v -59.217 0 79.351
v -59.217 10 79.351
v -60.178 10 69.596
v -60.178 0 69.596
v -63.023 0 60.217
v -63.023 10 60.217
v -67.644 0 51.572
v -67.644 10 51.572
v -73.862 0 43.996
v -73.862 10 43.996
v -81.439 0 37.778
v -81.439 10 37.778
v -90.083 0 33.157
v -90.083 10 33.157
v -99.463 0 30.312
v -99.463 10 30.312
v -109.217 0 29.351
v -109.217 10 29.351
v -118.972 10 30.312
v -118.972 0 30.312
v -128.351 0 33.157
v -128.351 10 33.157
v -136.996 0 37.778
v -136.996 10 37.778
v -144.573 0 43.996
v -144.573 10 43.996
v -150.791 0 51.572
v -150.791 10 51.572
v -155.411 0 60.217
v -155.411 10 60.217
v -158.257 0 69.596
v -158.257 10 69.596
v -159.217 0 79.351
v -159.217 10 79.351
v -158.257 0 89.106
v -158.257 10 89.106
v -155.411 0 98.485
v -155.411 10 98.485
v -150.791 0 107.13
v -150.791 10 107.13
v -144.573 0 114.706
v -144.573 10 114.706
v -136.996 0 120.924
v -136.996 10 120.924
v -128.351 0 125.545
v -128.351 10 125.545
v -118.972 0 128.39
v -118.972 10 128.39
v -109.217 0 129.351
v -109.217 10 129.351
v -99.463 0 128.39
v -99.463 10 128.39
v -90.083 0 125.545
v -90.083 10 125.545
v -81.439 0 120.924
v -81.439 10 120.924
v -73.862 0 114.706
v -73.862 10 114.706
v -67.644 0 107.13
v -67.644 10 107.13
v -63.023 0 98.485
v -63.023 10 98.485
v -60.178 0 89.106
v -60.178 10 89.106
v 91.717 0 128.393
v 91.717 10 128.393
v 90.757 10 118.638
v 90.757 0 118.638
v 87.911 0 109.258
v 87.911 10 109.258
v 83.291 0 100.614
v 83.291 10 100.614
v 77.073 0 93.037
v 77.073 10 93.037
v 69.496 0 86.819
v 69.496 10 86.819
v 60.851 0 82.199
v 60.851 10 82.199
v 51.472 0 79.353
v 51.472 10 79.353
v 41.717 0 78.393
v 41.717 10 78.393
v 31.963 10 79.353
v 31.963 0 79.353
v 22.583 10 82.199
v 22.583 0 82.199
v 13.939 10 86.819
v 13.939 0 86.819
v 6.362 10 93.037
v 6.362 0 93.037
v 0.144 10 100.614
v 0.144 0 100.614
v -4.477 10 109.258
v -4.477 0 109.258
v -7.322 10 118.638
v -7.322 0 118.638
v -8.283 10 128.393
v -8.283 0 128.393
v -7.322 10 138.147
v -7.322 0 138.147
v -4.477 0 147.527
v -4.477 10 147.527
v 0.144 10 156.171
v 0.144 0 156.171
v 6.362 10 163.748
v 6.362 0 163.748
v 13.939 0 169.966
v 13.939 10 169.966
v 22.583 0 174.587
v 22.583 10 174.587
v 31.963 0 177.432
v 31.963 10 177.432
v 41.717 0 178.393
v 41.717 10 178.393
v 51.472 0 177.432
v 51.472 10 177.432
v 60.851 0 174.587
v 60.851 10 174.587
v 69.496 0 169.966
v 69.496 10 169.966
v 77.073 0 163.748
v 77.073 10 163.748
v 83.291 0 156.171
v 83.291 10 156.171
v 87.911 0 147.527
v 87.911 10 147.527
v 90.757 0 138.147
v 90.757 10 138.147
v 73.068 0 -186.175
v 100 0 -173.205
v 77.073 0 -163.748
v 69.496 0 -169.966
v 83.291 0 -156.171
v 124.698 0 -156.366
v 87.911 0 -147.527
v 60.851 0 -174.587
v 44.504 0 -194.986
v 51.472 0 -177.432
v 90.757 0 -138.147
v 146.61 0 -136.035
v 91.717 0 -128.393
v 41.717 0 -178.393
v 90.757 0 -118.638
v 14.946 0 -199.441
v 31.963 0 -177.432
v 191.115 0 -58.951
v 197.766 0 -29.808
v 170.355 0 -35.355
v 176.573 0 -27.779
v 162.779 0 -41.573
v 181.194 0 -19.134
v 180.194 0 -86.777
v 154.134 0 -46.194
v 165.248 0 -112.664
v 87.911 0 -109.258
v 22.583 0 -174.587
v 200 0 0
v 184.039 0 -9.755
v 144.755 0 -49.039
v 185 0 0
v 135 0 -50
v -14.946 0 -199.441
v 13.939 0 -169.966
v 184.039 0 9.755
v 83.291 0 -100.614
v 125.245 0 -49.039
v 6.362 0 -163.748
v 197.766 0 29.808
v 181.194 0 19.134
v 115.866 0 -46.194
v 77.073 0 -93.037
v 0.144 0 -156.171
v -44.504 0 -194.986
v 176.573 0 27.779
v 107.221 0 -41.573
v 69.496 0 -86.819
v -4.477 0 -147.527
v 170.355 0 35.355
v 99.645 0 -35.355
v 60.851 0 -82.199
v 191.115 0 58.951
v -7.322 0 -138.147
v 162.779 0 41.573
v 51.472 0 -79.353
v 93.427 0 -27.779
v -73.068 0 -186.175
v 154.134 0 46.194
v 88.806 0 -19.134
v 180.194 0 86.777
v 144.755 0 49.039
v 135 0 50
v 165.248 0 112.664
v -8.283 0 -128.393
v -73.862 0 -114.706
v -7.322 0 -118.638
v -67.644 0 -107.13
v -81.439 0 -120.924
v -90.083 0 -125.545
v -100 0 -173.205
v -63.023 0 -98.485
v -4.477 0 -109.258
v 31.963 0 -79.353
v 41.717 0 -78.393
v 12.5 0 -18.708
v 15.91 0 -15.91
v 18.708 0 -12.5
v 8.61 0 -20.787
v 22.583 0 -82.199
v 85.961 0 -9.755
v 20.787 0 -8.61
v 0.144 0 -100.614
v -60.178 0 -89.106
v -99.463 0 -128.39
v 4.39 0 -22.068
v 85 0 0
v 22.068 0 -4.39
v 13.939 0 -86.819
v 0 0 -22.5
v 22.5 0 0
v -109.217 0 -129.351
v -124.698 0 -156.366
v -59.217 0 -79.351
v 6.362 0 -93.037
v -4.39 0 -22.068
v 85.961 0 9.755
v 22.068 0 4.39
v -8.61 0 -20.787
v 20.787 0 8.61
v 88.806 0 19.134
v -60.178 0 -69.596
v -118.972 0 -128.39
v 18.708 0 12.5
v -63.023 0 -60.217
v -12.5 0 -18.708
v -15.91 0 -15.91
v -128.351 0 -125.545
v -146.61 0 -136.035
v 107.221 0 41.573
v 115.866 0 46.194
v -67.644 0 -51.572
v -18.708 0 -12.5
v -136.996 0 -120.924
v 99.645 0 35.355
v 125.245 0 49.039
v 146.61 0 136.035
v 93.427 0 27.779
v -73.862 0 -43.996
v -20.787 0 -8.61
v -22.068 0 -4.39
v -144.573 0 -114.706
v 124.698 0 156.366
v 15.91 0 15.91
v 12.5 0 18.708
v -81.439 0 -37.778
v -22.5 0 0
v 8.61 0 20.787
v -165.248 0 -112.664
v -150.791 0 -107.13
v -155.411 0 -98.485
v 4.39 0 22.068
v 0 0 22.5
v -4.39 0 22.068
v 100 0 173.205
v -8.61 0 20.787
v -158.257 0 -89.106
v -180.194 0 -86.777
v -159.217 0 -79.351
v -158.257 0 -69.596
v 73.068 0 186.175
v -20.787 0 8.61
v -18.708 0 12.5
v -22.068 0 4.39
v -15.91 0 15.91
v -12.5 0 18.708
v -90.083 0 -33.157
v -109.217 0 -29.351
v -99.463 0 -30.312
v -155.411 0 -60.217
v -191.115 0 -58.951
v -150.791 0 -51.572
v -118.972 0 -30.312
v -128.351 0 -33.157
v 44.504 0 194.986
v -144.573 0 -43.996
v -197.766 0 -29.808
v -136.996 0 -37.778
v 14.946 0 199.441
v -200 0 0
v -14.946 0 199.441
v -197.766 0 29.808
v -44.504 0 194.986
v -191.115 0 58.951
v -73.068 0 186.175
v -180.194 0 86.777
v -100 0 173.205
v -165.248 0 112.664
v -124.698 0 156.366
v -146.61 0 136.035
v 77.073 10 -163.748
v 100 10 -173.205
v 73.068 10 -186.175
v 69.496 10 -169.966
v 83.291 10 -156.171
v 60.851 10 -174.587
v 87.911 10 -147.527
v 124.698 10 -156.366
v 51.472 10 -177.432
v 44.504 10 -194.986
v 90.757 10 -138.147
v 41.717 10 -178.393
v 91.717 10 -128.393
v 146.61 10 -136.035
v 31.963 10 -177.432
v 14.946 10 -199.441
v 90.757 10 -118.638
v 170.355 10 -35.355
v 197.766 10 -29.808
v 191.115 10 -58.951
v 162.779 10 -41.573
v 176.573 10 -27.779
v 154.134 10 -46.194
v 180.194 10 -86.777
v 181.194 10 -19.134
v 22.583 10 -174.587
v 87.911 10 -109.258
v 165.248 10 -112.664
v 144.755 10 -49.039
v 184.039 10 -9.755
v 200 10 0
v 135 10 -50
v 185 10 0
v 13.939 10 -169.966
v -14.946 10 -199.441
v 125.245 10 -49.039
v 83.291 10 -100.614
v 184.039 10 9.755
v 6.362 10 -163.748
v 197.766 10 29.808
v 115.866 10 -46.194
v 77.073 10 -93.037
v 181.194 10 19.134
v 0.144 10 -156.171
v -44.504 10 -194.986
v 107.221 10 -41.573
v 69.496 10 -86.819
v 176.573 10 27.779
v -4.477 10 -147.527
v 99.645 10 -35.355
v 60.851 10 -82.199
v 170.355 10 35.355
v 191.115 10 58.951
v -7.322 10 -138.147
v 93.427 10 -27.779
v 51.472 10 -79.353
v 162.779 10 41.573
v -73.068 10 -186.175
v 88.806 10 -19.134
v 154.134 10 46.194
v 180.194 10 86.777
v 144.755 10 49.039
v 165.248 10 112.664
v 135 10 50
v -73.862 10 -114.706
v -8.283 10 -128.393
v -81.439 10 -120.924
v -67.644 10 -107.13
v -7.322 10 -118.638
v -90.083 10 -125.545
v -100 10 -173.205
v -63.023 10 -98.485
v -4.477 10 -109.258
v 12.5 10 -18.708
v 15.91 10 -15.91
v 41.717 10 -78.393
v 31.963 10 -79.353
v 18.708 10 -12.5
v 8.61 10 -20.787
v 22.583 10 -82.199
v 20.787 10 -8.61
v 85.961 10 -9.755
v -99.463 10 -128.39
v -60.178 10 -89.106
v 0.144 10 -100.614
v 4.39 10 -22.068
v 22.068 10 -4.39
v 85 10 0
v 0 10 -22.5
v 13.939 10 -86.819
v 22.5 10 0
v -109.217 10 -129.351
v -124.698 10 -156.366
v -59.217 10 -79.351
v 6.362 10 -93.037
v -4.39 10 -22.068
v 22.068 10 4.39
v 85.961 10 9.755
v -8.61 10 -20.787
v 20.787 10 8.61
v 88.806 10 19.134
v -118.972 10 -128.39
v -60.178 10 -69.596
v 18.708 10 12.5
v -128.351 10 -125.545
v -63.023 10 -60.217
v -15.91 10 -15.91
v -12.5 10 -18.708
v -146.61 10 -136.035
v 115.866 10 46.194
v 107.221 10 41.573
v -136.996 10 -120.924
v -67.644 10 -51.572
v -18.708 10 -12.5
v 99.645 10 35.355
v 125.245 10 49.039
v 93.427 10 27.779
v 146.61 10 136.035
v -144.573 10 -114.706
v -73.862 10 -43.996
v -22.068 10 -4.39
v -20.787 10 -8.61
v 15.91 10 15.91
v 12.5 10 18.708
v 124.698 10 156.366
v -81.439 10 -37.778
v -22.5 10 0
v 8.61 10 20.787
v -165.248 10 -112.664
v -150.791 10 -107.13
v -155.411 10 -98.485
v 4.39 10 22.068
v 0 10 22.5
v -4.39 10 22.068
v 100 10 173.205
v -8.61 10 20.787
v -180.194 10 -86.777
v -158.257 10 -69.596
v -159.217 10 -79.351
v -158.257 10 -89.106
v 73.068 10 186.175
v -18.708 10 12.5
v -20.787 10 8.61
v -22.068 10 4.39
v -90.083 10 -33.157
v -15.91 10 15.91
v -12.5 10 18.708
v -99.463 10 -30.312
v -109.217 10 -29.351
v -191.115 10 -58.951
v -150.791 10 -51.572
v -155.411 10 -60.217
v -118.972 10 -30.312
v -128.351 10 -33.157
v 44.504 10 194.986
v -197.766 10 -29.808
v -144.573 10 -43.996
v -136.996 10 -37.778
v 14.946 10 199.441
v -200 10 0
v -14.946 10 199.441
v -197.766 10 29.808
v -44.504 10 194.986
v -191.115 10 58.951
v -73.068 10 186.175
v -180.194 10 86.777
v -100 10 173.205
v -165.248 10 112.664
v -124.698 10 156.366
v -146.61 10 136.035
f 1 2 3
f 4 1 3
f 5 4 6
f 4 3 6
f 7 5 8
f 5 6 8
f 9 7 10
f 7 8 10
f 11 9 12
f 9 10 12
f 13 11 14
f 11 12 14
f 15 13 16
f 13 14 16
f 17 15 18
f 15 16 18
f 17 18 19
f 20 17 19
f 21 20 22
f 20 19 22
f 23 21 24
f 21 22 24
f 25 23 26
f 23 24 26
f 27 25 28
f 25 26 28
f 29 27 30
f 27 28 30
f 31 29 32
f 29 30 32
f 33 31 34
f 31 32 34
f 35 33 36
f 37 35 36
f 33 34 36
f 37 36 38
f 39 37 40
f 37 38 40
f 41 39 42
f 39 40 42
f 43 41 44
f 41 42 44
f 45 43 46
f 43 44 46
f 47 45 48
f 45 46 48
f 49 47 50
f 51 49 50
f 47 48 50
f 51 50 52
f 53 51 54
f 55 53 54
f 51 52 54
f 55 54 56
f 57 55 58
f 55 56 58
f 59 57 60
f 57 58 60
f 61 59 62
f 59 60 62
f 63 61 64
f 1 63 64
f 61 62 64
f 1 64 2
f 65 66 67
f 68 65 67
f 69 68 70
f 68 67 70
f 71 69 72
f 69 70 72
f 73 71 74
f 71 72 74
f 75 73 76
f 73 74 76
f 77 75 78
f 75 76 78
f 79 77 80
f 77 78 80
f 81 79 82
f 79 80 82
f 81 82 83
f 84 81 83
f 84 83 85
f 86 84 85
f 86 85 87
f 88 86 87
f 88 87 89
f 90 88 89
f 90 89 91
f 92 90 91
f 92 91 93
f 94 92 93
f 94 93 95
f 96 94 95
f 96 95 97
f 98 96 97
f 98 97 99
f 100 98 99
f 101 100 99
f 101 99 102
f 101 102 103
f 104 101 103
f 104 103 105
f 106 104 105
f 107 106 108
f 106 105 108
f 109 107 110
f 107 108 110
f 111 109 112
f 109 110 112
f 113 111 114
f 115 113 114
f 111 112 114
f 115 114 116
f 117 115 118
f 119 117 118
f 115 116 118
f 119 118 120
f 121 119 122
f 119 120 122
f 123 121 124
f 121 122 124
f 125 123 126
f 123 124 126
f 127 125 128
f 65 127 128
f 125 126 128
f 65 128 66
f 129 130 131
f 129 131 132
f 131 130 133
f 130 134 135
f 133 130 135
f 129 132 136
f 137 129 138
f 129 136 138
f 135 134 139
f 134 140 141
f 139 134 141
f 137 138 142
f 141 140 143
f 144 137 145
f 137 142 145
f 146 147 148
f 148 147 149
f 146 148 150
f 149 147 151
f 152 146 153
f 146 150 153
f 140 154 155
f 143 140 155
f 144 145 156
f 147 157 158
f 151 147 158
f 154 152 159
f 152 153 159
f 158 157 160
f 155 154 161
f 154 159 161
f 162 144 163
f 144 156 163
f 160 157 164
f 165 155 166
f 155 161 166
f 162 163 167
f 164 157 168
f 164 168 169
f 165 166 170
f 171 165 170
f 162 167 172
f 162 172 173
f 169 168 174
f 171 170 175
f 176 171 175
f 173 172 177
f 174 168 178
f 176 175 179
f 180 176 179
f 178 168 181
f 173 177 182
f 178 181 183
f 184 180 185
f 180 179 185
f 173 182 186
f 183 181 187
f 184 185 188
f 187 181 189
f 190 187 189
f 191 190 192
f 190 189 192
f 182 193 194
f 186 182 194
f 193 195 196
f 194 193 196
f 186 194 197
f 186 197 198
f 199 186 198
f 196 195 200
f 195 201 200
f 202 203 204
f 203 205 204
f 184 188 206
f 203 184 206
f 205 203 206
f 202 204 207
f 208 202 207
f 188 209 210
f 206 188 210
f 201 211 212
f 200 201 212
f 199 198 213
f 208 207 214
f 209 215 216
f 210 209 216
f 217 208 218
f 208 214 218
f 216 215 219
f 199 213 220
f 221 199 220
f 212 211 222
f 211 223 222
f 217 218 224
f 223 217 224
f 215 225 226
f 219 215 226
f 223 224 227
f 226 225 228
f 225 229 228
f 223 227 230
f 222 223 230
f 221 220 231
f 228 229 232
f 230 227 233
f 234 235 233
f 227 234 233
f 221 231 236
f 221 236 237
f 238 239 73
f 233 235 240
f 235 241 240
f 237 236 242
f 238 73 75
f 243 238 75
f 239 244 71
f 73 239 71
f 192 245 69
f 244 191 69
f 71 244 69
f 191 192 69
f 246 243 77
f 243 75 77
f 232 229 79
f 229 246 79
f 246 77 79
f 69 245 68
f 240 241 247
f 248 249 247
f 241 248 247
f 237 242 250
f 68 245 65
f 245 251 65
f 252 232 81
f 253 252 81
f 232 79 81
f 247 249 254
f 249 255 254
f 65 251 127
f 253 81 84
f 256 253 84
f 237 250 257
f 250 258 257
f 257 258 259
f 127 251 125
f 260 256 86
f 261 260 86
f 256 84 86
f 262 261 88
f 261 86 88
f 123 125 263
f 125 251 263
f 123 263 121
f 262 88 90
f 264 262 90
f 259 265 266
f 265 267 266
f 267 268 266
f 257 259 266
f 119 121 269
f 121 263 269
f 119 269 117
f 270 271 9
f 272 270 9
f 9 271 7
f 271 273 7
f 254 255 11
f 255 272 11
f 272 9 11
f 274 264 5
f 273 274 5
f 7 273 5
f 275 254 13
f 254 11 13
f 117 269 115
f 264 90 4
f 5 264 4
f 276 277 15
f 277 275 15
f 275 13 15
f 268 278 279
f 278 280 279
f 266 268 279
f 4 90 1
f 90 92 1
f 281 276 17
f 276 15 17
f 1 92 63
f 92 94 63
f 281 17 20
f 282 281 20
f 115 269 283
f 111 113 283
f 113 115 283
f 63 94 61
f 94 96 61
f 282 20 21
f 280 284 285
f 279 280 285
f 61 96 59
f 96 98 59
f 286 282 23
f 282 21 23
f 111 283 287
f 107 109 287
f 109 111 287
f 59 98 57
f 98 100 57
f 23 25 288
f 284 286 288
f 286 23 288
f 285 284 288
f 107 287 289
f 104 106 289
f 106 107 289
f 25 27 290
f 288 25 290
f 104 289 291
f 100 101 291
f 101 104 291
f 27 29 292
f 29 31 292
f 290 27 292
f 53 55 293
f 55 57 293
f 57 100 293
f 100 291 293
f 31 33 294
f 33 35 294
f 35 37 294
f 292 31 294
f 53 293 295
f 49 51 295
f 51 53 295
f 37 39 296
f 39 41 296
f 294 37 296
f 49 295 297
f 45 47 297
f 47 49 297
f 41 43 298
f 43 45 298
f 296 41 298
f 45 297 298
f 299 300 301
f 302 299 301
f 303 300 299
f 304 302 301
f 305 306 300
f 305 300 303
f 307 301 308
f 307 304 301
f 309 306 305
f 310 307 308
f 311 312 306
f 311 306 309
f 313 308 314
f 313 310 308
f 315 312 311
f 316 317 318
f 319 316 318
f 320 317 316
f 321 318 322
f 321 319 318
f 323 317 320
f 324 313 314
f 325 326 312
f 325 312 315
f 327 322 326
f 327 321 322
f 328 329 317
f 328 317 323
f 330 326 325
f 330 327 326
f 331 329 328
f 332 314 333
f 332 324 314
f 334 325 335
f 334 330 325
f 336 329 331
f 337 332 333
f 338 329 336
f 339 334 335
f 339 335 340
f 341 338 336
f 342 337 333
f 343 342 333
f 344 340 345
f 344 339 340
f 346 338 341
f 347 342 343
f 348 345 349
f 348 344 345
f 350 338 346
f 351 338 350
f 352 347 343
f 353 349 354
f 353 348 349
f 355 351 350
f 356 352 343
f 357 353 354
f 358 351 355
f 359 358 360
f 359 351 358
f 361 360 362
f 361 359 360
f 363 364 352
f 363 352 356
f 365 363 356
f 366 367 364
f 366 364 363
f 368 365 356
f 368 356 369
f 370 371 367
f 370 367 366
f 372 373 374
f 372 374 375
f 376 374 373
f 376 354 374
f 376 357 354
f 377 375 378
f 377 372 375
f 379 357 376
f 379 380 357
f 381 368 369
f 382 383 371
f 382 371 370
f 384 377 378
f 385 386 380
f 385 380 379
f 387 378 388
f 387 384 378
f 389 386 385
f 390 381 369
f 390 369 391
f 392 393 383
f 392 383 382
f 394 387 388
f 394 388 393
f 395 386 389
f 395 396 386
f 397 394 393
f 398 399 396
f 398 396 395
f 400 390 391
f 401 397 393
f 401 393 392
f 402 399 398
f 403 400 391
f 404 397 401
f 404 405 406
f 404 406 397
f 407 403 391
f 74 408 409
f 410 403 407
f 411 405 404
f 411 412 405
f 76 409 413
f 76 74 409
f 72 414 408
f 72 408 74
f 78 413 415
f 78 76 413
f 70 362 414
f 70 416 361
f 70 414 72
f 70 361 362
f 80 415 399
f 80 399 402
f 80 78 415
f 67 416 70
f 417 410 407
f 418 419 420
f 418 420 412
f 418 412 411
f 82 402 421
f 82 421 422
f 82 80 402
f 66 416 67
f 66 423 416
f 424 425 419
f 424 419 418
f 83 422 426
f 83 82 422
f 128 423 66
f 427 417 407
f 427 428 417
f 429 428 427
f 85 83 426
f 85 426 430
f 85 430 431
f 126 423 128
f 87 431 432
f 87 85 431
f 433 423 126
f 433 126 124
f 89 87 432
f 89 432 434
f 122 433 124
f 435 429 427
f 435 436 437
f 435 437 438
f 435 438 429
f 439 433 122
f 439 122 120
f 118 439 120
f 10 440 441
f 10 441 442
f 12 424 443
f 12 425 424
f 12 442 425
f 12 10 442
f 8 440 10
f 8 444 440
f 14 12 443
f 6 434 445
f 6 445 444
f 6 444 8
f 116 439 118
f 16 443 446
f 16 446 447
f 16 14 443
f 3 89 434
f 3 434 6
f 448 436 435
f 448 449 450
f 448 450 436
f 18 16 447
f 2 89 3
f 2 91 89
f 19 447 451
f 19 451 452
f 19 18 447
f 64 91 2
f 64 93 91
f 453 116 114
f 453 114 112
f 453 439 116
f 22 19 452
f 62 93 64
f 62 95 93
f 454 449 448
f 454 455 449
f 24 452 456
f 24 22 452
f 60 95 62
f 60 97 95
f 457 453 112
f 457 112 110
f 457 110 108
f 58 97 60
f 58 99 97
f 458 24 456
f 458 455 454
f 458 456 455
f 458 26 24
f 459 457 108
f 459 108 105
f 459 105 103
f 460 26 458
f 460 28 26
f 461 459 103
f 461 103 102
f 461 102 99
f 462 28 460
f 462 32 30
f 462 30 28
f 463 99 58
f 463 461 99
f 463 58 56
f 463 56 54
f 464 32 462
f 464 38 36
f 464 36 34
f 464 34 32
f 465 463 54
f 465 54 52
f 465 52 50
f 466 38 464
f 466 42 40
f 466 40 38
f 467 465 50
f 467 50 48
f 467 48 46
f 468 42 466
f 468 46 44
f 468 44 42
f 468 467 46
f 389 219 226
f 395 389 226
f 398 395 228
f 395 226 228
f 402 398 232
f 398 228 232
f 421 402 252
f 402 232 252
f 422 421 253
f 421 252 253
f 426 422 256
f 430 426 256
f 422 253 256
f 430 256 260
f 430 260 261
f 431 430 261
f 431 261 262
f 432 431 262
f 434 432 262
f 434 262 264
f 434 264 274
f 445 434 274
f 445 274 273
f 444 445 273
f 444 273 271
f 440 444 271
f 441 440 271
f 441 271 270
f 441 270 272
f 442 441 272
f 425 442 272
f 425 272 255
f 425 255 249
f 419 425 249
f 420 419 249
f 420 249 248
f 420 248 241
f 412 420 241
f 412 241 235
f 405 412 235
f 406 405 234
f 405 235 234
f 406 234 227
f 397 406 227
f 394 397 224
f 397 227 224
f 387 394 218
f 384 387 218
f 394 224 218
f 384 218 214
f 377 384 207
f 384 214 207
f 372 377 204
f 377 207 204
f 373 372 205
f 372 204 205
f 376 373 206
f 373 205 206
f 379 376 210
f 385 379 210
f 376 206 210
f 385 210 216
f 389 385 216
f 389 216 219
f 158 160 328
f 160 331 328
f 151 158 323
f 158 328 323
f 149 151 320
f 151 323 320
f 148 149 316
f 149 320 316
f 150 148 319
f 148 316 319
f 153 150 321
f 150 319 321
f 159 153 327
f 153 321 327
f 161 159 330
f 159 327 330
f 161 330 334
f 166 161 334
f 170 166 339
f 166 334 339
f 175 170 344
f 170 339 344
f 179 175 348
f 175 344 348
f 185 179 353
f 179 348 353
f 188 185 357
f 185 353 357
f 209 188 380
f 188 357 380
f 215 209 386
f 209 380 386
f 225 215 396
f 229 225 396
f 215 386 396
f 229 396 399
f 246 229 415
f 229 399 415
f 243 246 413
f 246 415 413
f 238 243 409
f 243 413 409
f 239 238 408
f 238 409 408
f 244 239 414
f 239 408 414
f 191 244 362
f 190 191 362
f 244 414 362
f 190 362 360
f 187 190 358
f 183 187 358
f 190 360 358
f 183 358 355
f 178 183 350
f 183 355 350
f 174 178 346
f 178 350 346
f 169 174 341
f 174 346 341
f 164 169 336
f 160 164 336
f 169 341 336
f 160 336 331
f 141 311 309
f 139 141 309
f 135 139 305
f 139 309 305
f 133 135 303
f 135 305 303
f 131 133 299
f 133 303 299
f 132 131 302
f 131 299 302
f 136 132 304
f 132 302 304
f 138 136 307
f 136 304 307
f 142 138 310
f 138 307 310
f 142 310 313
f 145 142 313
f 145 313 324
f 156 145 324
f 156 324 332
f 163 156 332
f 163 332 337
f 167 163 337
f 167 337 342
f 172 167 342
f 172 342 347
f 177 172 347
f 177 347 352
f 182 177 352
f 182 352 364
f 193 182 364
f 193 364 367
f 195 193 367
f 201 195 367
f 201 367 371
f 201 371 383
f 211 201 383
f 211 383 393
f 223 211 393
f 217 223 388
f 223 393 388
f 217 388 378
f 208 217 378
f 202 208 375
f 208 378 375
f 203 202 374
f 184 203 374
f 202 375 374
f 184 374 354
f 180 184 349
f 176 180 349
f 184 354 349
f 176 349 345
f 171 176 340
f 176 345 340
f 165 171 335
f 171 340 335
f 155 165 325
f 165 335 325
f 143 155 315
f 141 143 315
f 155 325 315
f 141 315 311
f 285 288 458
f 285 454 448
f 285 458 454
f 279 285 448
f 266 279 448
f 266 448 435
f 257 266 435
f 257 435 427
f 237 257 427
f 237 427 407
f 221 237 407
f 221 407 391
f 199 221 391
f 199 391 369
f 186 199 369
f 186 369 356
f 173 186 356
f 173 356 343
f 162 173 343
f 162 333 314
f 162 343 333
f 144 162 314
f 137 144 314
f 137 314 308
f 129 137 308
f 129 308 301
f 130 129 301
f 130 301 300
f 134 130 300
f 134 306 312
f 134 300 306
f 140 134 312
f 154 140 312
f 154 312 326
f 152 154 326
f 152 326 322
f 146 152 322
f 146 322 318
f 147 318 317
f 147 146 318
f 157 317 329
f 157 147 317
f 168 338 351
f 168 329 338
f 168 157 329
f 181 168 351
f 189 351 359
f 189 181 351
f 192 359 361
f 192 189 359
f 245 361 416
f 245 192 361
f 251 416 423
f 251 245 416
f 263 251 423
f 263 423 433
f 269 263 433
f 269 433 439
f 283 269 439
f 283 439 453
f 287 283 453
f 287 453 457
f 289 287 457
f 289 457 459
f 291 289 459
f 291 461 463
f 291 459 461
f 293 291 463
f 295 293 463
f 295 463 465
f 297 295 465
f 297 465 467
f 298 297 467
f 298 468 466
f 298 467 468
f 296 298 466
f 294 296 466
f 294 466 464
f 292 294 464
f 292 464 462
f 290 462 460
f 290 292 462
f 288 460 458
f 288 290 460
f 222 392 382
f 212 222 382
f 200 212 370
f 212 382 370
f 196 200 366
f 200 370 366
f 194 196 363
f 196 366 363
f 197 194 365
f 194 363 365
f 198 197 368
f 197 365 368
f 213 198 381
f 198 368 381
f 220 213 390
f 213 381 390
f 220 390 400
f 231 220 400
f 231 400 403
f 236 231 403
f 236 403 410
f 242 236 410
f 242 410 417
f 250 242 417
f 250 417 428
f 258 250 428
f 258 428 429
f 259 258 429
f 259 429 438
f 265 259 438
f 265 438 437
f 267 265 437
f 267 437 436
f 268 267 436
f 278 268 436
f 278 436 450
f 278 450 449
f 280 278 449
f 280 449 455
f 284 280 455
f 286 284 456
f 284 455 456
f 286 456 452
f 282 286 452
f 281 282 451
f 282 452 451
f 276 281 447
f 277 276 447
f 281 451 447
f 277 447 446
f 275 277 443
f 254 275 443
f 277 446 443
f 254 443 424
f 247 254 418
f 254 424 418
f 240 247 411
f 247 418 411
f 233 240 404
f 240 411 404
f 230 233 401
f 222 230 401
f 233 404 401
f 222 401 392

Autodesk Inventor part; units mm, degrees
ref_plane "YZ Plane" through (0, 0, 0) normal (1, 0, 0) x (0, 1, 0)
ref_plane "XZ Plane" through (0, 0, 0) normal (0, 1, 0) x (-1, 0, 0)
ref_plane "XY Plane" through (0, 0, 0) normal (0, 0, 1) x (1, 0, 0)
sketch "Skizze1" plane through (0, 0, 0) normal (0, 1, 0) x (-1, 0, 0)
  circle A0 centre (0, 0) radius 200
  dimension "d0" = 400
extrude "Extrusion1" add sketch "Skizze1" along normal blind 10
sketch "Skizze2" plane through (0, 10, 0) normal (0, 1, 0) x (1, 0, 0)
  circle A0 centre (0, 0) radius 200 projected
  line L0 (0, 0) -> (200, 0) construction
  line L1 (0, 0) -> (61.8034, 190.2113)
  line L2 (0, 0) -> (200, 0) construction
  line L3 (0, 0) -> (-161.8034, 117.5571)
  line L4 (0, 0) -> (200, 0) construction
  line L5 (0, 0) -> (61.8034, -190.2113)
  line L6 (0, 0) -> (-161.8034, -117.5571)
  line L7 (0, 0) -> (200, 0)
  line L8 (200, 0) -> (100, 0)
  line L9 (0, 0) -> (30.9017, -95.1057)
  line L10 (200, 0) -> (135, 0)
  circle A1 centre (135, 0) radius 50
  line L11 (61.8034, -190.2113) -> (41.7173, -128.3926)
  circle A2 centre (41.7173, -128.3926) radius 50
  line L12 (-161.8034, -117.5571) -> (-109.2173, -79.351)
  circle A3 centre (-109.2173, -79.351) radius 50
  line L13 (-161.8034, 117.5571) -> (-109.2173, 79.351)
  circle A4 centre (-109.2173, 79.351) radius 50
  line L14 (61.8034, 190.2113) -> (41.7173, 128.3926)
  circle A5 centre (41.7173, 128.3926) radius 50
  dimension "d4" = 72
  dimension "d5" = 144
  dimension "d9" = 65
  dimension "d10" = 100
  dimension "d11" = 65
  dimension "d12" = 100
  dimension "d13" = 65
  dimension "d14" = 100
  dimension "d15" = 65
  dimension "d16" = 100
  dimension "d17" = 65
  dimension "d18" = 100
extrude "Extrusion4" cut sketch "Skizze2" against normal blind 10 contours A1 L7 | L7 A1 | A5 L1 | L1 A5 | A2 L5 | L5 A2 | A4 L3 | L3 A4 | A3 L6 | L6 A3
sketch "Skizze5" plane through (0, 0, 0) normal (0, -1, 0) x (1, 0, 0)
  circle A0 centre (0, 0) radius 22.5
  dimension "d27" = 45
extrude "Extrusion5" cut sketch "Skizze5" against normal blind 10
properties part number "Drehplatte_Rahmenvorrrichtung"
